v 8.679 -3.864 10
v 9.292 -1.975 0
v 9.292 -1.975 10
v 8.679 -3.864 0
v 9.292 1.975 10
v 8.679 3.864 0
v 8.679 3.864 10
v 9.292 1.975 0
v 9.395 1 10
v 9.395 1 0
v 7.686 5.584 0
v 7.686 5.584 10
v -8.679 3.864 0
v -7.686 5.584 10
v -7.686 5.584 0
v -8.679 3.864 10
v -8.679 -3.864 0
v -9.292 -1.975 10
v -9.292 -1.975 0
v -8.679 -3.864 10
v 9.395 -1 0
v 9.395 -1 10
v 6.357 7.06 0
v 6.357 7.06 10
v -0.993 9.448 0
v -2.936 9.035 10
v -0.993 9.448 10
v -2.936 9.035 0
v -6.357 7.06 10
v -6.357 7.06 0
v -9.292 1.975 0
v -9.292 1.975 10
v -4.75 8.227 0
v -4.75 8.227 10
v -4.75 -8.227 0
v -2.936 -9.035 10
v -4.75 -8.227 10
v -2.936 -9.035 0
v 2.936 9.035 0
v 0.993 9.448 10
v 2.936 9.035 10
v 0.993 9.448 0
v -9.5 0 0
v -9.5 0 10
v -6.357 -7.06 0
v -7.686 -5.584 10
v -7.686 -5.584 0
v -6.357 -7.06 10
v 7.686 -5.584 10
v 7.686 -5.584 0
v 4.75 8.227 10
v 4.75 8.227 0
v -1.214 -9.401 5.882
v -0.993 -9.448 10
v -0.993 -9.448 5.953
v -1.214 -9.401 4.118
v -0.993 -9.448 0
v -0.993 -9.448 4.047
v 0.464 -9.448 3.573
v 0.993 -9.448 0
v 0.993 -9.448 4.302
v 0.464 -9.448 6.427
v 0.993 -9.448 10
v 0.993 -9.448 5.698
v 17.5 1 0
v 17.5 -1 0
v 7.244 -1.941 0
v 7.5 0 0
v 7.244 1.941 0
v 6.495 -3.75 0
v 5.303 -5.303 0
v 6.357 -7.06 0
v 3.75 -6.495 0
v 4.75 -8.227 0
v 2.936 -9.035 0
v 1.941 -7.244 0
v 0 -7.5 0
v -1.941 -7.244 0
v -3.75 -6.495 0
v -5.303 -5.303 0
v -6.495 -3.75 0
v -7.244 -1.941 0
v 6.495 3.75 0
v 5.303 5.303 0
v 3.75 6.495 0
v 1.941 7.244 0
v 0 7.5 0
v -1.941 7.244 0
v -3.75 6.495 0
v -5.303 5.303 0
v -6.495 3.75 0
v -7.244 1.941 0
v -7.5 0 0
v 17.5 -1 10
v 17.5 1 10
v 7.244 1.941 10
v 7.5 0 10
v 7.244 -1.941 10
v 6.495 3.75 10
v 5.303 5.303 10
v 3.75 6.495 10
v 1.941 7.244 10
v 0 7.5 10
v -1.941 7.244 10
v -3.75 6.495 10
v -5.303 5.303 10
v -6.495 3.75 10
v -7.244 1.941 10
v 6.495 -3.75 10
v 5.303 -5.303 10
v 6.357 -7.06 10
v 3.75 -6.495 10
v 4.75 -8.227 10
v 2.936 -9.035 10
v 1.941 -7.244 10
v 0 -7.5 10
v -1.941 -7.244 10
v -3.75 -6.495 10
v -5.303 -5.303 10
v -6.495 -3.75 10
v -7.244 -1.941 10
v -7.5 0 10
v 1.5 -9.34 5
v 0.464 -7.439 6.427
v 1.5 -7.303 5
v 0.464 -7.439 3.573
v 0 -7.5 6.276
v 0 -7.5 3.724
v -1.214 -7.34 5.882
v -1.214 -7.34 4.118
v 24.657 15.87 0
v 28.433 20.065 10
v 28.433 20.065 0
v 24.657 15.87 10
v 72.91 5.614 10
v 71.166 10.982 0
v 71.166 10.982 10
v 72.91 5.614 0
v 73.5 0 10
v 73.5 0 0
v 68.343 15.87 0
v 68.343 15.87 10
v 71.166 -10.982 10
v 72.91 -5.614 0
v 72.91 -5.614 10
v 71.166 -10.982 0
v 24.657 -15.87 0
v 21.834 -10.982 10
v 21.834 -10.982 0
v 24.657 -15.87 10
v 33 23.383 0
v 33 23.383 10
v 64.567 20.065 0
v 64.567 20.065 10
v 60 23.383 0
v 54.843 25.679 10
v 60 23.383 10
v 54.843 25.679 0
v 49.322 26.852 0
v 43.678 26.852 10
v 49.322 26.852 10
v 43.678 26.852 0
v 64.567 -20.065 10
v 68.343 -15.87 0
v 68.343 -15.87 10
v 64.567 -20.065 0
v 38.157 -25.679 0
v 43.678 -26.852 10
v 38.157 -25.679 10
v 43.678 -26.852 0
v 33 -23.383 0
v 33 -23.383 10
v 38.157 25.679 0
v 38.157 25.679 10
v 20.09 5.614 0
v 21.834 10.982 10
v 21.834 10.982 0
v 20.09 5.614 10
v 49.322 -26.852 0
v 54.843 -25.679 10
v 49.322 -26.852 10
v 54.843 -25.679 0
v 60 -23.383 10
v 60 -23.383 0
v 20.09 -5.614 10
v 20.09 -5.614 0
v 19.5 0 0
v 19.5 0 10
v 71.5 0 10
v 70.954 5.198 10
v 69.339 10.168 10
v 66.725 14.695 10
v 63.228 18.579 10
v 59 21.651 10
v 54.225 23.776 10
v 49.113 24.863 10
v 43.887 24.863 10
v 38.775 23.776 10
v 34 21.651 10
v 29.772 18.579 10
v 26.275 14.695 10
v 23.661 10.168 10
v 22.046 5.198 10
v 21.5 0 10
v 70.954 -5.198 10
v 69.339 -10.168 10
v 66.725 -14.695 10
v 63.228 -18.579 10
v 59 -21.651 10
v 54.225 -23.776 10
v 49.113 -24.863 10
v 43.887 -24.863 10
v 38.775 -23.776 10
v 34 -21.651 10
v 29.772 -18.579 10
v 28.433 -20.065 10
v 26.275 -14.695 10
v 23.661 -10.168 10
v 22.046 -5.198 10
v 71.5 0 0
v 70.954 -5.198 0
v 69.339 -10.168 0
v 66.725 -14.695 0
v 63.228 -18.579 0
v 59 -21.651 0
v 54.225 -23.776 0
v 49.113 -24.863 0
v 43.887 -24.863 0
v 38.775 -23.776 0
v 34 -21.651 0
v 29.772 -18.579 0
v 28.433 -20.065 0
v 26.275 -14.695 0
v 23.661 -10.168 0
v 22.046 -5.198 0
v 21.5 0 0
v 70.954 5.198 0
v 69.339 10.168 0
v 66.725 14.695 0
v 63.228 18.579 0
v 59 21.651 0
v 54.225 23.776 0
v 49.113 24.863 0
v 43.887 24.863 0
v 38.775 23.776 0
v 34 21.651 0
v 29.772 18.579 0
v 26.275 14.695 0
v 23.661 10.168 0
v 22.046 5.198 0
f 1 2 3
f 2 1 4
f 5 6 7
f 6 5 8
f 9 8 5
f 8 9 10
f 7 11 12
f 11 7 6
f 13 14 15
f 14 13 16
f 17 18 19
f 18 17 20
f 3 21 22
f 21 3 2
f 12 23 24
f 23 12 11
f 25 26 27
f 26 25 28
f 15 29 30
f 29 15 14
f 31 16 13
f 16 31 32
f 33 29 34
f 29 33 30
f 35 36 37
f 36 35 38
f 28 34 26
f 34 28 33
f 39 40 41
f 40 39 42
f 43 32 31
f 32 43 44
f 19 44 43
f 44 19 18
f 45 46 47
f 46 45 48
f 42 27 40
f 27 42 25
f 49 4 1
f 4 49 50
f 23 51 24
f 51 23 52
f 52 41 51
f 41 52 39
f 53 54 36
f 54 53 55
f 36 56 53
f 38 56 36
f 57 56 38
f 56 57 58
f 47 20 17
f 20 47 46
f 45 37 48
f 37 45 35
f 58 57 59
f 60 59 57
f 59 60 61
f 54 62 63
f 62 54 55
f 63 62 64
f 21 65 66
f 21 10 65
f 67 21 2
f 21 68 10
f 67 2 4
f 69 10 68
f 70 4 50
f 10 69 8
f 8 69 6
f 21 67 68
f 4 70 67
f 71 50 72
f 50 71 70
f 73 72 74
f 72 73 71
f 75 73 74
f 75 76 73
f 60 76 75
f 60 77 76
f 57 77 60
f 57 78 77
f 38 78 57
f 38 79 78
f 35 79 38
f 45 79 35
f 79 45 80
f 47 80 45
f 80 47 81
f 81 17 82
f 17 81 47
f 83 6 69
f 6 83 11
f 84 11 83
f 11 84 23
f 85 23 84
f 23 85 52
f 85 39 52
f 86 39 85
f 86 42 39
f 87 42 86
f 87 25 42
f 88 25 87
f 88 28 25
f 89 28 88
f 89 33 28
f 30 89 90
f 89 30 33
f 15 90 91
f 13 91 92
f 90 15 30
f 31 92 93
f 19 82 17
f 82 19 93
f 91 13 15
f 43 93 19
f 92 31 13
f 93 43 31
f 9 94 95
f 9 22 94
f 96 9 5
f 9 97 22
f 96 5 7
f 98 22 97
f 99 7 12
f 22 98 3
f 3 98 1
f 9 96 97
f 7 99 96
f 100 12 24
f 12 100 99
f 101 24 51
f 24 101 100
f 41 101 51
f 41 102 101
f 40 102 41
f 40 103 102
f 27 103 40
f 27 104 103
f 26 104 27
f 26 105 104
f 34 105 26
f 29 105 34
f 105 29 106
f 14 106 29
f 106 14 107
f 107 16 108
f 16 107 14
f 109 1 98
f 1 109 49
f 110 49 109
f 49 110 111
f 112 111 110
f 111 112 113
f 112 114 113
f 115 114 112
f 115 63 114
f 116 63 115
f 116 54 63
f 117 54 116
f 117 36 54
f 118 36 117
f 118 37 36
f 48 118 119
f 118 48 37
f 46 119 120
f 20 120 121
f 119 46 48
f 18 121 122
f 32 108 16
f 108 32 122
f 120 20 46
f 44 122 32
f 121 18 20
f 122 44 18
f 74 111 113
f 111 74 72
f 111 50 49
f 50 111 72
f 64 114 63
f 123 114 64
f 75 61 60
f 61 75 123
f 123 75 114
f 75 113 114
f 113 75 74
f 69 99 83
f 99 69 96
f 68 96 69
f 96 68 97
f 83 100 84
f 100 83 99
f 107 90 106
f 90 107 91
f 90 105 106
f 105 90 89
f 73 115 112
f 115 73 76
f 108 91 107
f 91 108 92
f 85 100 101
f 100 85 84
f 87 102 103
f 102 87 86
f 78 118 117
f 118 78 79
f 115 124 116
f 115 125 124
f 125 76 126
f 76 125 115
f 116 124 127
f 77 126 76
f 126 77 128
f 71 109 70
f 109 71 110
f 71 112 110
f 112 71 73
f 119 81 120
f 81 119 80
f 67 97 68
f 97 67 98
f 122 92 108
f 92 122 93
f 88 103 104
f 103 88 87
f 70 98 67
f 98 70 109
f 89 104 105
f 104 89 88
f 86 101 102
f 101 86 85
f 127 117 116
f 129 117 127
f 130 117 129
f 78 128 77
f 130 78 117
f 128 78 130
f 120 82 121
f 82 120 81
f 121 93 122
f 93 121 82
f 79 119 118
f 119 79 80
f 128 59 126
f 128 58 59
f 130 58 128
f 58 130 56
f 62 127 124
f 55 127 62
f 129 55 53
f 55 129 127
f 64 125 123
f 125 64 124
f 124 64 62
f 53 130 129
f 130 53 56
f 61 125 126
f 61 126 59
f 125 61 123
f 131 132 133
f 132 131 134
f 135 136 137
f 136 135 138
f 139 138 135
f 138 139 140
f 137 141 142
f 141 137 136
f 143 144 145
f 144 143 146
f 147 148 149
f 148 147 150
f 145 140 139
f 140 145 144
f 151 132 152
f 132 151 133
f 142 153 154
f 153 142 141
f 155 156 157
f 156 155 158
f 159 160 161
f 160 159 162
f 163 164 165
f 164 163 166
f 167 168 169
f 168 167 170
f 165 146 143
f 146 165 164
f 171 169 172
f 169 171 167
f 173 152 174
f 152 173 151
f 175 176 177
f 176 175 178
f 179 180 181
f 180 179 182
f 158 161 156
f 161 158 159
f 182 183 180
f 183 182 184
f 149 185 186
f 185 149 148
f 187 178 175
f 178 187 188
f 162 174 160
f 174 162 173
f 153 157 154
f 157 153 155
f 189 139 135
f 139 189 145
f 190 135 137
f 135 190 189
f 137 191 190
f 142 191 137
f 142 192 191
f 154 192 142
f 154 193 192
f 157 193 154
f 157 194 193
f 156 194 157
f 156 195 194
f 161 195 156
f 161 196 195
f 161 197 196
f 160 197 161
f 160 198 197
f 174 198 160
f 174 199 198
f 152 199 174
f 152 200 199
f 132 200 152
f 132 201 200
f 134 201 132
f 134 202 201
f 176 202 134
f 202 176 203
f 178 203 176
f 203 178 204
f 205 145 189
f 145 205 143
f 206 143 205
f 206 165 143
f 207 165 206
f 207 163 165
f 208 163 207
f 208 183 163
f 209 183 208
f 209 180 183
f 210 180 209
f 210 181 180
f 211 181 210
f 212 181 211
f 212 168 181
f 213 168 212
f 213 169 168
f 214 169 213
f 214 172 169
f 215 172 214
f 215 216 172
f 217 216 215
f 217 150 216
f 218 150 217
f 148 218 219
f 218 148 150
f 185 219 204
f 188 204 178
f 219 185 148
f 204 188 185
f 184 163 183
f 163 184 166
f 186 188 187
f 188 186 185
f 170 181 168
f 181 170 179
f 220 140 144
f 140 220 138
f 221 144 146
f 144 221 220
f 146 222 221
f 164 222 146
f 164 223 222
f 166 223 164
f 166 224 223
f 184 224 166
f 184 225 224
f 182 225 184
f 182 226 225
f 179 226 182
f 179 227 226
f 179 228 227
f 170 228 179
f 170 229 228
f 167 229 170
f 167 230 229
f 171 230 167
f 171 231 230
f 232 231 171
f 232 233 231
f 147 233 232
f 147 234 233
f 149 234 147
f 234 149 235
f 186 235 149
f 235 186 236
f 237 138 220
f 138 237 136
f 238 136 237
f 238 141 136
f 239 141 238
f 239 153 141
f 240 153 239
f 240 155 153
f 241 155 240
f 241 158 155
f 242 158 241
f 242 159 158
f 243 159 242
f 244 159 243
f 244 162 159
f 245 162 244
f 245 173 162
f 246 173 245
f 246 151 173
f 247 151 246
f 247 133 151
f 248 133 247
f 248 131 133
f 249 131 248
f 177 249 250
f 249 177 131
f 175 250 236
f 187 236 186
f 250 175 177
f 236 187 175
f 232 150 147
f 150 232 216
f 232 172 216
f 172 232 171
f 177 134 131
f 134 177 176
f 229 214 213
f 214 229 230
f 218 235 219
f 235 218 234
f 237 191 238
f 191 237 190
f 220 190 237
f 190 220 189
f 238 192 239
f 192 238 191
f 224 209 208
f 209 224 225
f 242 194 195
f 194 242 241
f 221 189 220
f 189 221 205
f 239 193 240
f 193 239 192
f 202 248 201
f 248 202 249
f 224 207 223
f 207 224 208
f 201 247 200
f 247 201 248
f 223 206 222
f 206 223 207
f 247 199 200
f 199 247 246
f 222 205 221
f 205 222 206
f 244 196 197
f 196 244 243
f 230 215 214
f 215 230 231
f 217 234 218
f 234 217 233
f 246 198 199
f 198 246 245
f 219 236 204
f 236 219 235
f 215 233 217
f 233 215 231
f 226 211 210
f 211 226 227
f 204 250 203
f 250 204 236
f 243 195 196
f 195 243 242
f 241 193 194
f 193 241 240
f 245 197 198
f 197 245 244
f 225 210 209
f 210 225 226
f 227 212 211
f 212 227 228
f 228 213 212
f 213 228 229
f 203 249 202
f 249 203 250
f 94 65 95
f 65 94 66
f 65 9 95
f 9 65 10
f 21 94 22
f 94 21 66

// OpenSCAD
Thickness = 2; //[]
Ball_od = 50; //[]
SupportCirc = 15; //[]
Height = 10; //[]
Circle_Offset = 10; //[]

union() {
	difference() {
		cylinder(d = (SupportCirc + (2 * Thickness)), h = Height);
		translate(v = [0, 0, (-(Height / 2))]) {
			cylinder(d = SupportCirc, h = (2 * Height));
		}
		translate(v = [0, 0, (Height / 2)]) {
			rotate(a = [90, 0, 0]) {
				cylinder(d = 3, h = 30);
			}
		}
	}
	translate(v = [((((Ball_od + (2 * Thickness)) + (SupportCirc + (2 * Thickness))) / 2) + Circle_Offset), 0, 0]) {
		difference() {
			cylinder(d = (Ball_od + (2 * Thickness)), h = Height);
			translate(v = [0, 0, (-(Height / 2))]) {
				cylinder(d = Ball_od, h = (2 * Height));
			}
		}
	}
	translate(v = [0, (-(Thickness / 2)), 0]) {
		translate(v = [(SupportCirc / 2), 0, 0]) {
			cube(size = [Circle_Offset, Thickness, Height]);
		}
	}
}
